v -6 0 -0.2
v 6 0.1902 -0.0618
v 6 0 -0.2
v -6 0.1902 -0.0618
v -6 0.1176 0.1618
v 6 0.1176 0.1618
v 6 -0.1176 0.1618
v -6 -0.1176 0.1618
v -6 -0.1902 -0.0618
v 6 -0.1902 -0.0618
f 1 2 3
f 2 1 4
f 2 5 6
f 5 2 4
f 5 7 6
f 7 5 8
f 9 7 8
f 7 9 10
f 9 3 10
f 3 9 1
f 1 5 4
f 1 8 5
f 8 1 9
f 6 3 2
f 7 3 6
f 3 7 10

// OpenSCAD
module shaft (t=[0,0,0],h=12){
   color("silver") 
   translate(t)
   rotate([90,90,90])
   cylinder(h,r=0.2,center=true);
}
 
 shaft();
